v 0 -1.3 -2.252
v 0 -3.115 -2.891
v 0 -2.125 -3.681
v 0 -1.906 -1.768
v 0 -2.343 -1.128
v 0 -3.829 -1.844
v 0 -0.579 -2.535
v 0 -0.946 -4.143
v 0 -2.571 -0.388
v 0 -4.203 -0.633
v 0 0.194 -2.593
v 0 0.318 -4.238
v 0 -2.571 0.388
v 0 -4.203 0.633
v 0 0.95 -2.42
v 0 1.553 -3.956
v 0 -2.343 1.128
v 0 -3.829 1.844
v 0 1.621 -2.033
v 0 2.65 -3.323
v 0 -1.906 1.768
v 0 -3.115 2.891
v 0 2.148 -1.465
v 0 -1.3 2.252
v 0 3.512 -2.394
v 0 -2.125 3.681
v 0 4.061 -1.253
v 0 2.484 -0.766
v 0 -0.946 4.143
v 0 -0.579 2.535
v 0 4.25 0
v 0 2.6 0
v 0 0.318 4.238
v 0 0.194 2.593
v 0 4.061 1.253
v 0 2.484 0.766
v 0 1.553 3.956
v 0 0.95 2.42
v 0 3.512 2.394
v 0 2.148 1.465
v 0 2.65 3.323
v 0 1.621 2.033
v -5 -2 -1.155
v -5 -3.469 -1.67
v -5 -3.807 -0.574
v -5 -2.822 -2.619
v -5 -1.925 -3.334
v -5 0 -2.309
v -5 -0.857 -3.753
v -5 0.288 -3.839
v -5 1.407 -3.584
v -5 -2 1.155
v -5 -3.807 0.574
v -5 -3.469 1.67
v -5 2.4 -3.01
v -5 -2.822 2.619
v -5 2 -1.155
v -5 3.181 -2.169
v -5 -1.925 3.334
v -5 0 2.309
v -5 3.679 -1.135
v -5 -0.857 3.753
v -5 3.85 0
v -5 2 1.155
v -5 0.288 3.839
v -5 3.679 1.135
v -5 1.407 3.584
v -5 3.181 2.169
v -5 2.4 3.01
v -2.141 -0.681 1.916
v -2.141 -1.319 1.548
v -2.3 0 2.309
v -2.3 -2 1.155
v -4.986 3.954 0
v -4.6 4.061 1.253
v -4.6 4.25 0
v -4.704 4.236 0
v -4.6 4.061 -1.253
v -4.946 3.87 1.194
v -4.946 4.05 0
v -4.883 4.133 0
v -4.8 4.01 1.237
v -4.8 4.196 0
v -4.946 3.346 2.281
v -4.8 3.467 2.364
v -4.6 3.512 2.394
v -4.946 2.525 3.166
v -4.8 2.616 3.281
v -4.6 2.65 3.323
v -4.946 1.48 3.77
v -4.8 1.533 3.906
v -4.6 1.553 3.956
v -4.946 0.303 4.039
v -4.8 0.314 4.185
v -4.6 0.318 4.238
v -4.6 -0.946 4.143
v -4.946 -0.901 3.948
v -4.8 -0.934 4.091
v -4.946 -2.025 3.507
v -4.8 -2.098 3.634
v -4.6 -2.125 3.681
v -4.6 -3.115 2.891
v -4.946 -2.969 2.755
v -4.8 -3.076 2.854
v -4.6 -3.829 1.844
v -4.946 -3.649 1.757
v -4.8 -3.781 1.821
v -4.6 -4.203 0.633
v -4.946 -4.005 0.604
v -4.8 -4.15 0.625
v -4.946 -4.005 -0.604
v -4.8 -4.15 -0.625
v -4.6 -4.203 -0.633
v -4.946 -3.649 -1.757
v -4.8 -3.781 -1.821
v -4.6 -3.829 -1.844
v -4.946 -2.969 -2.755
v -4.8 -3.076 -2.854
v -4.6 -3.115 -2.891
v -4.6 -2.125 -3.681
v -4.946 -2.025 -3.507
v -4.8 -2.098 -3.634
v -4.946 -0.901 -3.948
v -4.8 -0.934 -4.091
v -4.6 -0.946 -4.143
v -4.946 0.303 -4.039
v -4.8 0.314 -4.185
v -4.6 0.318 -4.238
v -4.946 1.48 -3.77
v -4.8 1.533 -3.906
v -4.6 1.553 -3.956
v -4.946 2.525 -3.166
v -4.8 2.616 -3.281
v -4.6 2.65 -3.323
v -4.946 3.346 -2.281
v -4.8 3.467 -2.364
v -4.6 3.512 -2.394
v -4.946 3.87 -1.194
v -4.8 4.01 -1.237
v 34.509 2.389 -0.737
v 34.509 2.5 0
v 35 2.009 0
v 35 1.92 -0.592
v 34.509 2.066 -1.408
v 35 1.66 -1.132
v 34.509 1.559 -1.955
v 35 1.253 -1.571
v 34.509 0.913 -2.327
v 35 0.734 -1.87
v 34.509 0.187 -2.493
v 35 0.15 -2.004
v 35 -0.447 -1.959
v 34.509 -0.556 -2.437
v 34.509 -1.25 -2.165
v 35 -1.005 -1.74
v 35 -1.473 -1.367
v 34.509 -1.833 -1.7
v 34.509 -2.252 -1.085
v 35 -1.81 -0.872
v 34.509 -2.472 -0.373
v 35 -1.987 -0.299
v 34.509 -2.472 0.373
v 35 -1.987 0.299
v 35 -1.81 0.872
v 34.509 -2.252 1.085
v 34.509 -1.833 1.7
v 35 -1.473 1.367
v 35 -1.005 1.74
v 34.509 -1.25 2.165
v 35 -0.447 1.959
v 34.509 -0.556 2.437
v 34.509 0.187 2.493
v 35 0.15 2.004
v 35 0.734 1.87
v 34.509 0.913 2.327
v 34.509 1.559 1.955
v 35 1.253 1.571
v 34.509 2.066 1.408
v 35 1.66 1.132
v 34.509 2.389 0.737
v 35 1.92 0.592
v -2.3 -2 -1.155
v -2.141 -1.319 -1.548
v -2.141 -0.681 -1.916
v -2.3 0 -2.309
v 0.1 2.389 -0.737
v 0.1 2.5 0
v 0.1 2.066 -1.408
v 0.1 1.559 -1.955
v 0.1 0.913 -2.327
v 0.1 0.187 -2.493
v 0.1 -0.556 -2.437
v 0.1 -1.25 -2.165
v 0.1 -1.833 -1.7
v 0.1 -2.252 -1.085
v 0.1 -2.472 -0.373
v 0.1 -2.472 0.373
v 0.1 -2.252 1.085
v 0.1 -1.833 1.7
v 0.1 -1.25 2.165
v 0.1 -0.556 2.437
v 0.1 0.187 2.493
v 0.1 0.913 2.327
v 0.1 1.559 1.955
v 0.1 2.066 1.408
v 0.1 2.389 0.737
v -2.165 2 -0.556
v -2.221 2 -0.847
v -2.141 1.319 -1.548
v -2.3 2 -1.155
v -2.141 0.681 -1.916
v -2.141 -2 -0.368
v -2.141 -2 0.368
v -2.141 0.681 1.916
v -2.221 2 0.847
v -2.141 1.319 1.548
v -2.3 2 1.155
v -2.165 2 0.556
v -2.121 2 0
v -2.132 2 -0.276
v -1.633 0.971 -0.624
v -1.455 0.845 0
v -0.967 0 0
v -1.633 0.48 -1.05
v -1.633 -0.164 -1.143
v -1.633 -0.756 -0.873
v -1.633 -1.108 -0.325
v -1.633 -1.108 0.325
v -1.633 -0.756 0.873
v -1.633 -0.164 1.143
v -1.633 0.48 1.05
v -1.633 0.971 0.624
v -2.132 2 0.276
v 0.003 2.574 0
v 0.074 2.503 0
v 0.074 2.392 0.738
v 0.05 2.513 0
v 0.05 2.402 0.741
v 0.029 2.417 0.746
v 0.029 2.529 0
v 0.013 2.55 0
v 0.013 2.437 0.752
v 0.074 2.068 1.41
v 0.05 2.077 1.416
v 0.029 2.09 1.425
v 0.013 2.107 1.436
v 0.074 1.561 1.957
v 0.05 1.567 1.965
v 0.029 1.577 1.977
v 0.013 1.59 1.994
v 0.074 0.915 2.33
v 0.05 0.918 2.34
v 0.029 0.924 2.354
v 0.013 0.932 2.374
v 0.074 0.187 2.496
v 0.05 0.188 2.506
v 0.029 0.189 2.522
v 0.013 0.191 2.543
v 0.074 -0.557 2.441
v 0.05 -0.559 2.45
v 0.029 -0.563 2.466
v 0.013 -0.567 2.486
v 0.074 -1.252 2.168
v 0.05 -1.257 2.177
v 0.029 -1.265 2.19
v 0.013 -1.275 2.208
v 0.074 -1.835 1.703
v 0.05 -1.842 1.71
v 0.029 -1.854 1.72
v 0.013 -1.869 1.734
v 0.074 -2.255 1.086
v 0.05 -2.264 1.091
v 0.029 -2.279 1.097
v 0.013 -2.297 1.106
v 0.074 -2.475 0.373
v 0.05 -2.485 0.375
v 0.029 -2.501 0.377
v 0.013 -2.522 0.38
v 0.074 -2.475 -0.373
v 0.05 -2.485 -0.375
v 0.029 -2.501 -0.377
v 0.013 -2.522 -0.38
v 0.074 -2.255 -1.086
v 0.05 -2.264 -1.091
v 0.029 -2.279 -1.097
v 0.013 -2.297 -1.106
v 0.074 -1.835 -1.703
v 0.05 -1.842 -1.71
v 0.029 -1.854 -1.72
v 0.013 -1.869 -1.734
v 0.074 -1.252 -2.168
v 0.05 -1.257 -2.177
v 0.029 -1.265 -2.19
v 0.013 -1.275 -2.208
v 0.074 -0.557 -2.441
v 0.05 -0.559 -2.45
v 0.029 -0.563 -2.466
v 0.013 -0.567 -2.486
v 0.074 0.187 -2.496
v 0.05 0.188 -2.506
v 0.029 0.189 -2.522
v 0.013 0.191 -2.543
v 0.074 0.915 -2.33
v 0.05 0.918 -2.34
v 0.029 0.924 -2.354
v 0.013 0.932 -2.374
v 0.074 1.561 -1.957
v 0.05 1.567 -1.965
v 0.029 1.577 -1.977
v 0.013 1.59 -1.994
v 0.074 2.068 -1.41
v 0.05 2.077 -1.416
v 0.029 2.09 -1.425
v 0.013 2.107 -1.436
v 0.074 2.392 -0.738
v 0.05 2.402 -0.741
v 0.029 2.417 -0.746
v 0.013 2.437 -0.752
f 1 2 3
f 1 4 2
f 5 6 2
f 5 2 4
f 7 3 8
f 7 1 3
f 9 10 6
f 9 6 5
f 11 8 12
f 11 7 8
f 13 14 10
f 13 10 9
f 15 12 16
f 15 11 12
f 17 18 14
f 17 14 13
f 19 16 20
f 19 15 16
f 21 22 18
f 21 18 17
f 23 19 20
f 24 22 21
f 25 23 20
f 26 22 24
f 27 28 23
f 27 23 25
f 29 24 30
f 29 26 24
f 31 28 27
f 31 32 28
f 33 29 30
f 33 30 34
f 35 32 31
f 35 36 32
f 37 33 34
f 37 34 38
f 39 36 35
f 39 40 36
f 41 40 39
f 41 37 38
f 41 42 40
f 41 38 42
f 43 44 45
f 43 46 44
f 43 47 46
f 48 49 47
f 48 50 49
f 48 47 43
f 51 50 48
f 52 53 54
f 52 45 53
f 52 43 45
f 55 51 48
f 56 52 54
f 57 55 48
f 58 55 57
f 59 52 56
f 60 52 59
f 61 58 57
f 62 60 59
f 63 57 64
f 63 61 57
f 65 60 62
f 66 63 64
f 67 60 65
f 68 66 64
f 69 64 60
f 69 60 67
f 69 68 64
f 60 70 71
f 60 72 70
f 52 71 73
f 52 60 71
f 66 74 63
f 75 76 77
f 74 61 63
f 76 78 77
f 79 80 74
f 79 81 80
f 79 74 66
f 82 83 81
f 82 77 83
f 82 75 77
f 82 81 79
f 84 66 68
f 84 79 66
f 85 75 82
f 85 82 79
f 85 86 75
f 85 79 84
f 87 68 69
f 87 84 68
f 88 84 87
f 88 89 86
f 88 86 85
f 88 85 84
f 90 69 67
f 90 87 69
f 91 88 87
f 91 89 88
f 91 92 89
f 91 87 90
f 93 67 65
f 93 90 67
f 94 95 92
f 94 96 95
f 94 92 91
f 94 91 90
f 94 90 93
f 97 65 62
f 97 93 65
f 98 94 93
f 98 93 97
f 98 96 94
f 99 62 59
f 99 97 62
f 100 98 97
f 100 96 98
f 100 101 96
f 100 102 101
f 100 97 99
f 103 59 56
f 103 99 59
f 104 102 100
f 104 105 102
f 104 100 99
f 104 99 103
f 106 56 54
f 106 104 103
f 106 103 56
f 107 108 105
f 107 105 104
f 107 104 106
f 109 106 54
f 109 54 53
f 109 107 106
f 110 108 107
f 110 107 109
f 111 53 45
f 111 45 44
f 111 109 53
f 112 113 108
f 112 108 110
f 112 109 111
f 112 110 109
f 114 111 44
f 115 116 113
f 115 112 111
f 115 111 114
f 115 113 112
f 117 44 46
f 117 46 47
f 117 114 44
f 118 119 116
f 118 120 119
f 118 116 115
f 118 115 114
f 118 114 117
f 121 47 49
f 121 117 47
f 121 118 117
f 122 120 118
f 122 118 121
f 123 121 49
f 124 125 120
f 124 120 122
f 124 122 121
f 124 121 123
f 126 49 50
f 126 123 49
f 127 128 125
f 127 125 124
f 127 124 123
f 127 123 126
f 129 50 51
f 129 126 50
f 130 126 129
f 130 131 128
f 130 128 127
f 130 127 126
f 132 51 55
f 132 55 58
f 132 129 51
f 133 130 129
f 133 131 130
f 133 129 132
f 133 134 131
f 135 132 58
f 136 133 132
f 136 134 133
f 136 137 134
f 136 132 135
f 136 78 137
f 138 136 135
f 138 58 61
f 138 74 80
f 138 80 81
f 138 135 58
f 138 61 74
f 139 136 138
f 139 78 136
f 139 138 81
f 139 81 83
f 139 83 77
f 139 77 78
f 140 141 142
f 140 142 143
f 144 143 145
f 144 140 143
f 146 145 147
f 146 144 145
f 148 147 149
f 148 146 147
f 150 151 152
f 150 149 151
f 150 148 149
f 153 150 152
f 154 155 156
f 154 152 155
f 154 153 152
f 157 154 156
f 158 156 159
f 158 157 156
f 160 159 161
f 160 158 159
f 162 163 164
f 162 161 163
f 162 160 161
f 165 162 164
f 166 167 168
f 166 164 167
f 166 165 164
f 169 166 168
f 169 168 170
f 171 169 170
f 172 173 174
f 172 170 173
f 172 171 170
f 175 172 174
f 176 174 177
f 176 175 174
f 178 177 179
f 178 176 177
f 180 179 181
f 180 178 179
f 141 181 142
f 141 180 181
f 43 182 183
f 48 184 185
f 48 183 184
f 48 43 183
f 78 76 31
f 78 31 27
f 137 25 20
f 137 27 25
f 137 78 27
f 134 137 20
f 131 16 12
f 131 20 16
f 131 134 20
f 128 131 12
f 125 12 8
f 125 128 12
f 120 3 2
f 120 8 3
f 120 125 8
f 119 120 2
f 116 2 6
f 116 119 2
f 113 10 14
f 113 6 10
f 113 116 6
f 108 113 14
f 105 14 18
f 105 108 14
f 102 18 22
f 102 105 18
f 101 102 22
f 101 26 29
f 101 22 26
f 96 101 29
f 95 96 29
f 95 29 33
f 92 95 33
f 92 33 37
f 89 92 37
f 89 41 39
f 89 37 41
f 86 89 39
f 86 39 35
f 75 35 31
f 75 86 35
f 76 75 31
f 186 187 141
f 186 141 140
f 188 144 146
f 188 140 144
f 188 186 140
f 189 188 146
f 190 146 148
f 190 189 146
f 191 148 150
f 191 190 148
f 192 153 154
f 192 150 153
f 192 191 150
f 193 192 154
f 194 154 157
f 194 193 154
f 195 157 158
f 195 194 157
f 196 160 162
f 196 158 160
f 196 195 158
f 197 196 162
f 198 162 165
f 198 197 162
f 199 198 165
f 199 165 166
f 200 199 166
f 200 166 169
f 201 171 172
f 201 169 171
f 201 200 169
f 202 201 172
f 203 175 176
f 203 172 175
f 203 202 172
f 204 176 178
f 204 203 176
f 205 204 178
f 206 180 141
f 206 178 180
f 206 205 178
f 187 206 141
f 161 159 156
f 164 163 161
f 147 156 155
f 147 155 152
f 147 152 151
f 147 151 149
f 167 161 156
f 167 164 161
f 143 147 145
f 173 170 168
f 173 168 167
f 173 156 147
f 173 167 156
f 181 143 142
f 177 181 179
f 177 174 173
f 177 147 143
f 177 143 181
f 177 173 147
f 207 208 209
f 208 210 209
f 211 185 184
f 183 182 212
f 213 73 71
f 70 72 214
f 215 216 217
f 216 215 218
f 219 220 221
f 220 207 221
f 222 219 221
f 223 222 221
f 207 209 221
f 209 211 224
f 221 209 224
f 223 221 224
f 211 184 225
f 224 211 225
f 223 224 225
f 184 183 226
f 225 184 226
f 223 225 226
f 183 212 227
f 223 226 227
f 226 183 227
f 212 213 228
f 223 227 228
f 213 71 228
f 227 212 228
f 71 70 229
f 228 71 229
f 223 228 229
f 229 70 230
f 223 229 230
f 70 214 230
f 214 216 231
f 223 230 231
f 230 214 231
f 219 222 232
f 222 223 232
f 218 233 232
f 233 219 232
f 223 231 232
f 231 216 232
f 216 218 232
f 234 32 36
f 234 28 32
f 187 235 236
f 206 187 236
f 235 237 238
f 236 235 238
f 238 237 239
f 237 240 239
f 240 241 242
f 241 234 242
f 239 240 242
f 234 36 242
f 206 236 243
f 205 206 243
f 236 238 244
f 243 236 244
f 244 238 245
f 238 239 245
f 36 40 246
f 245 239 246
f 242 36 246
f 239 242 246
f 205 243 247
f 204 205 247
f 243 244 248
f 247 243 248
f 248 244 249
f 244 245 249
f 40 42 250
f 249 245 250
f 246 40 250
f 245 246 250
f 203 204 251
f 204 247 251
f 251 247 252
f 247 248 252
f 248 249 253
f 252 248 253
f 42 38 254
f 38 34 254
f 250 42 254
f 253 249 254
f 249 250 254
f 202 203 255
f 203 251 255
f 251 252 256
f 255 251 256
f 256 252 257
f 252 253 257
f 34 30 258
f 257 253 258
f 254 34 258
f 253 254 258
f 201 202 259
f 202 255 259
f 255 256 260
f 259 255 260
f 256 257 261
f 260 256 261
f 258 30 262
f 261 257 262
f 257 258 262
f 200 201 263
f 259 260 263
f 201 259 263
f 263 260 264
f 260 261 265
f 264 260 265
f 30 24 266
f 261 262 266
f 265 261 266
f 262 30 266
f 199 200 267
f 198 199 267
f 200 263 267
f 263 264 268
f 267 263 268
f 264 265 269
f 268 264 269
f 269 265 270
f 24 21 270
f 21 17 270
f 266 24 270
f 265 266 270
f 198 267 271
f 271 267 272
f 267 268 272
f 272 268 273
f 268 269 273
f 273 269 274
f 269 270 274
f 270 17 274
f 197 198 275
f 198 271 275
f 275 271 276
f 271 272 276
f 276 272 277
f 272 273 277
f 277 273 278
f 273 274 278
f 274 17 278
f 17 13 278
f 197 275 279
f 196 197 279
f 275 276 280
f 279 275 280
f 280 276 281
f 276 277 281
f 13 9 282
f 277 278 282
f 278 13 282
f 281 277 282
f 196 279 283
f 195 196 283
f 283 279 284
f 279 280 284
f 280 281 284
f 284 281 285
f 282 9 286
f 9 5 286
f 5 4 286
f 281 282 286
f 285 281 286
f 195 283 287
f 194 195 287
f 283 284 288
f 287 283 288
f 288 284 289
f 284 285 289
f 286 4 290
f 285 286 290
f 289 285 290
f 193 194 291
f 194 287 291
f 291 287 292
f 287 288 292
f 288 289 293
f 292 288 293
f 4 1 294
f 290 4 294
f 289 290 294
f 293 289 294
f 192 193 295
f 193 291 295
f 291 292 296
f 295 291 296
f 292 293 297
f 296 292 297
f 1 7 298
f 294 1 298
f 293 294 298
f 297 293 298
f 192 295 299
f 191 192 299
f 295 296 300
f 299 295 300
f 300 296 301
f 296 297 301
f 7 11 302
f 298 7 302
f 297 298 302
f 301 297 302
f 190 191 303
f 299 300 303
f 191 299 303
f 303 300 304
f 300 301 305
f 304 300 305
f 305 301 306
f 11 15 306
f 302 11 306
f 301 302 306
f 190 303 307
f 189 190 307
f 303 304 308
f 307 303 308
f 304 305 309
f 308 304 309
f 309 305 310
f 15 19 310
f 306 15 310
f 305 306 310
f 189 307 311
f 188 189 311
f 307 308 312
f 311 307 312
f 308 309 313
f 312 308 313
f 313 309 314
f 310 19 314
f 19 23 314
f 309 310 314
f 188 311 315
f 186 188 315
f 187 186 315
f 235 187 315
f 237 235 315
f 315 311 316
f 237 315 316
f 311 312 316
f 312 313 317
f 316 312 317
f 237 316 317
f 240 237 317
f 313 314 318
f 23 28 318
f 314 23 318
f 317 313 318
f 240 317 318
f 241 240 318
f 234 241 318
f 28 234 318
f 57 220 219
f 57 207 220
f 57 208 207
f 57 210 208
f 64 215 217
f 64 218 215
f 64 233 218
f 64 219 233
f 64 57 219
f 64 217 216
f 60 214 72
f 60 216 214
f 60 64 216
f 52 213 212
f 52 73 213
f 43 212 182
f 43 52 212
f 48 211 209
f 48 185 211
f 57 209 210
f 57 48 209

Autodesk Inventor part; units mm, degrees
ref_plane "YZ Plane" through (0, 0, 0) normal (1, 0, 0) x (0, 1, 0)
ref_plane "XZ Plane" through (0, 0, 0) normal (0, 1, 0) x (-1, 0, 0)
sketch "Sketch1" plane through (0, 0, 0) normal (0, 0, 1) x (1, 0, 0)
  line L0 (-0.9667, 0) -> (35, 0)
  line L1 (35, 0) -> (35, 2.5)
  line L2 (35, 2.5) -> (19, 2.5)
  line L3 (19, 2.5) -> (18.5091, 2.5)
  line L4 (18.5091, 2.5) -> (0, 2.5)
  line L5 (0, 2.5) -> (0, 4.25)
  line L6 (0, 4.25) -> (-5, 4.25)
  line L7 (-5, 4.25) -> (-5, 2.3094)
  line L8 (-5, 2.3094) -> (-2.3, 2.3094)
  line L9 (-2.3, 2.3094) -> (-0.9667, 0)
  line L10 (-13, 0) -> (43, 0) projected
  line L11 (0, -0.85) -> (0, 5.1) projected
  line L12 (19, 2.5) -> (0, 2.5) construction
  dimension "d1" = 16
  dimension "d2" = 0.4909
  dimension "d3" = 5
  dimension "d4" = 2.7
  dimension "d5" = 60
  dimension "d6" = 5
  dimension "d7" = 5
  dimension "d8" = 4.6188
  dimension "d9" = 8.5
  dimension "d26" = 35
revolve "Body" add sketch "Sketch1" angle 360 about axis through (-0.9667, 0, 0) along (1, 0, 0)
sketch "Sketch2" plane through (-5, 0, 0) normal (-1, 0, 0) x (0, 0, 1)
  circle A0 centre (0, 0) radius 2.3094 projected
  line L0 (0, -5.95) -> (0, 5.95) projected
  line L1 (-5.95, 0) -> (5.95, 0) projected
  line L2 (2.3094, 0) -> (1.1547, -2)
  line L3 (1.1547, -2) -> (-1.1547, -2)
  line L4 (-1.1547, -2) -> (-2.3094, 0)
  line L5 (-2.3094, 0) -> (-1.1547, 2)
  line L6 (-1.1547, 2) -> (1.1547, 2)
  line L7 (1.1547, 2) -> (2.3094, 0)
extrude "Slot" add sketch "Sketch2" against normal up to next contours L7 A0 | A0 L2 | L6 L0 A0 | A0 L0 L3 | L0 L6 A0 | A0 L3 L0 | L4 A0 | A0 L5
fillet "Fillet1" radius 0.4 1 edges at (-5, -4.25, 0)
thread "Thread" size "M5x0.8" class "6g" standard "ISO Metric profile" length 16
chamfer "Chamfer1" distance 0.4908 distance2 0.4908 1 edges at (35, -2.5, 0) measured on face at (35, -0.7192, 0.1653)
ref_plane "Work Plane1" through (29, 0, 0) normal (0, -1, 0) x (1, 0, 0)
fillet "Fillet2" radius 0.1 1 edges at (0, -2.5, 0)
equation "\"d30\" = R"
equation "\"d17\" = RR"
equation "\"d13\" = GEL"
equation "\"d15\" = -0.5 * SPD + 0.5 * GD"
equation "\"d16\" = GUL"
equation "\"d1\" = GEL"
equation "\"d3\" = KOH"
equation "\"d4\" = INTI"
equation "\"d6\" = GD"
equation "\"d7\" = BDM"
equation "\"d8\" = 1.1547 * SW"
equation "\"d9\" = KOD"
equation "\"d26\" = NLG"
equation "\"GD\" = NND"
equation "\"NLG\" = 35"
equation "\"GEL\" = 16"
equation "\"KOD\" = 8.5"
equation "\"KOH\" = NND"
equation "\"INTI\" = 2.7"
equation "\"GAL\" = 0.61345 * PTC"
equation "\"GUL\" = 0.61345 * PTC"
equation "\"BDM\" = NND"
equation "\"SW\" = 4"
equation "\"RR\" = 0.4"
equation "\"SPD\" = NND - 1.2269 * PTC"
equation "\"R\" = 0.1"
equation "\"TOA\" = 30deg"
equation "\"GD1\" = THREADDIA - 1.2269 * PTC"
equation "\"THREADDIA\" = 5"
equation "\"FAWI\" = 45deg"
equation "\"PTC\" = 0.8"
equation "\"NND\" = 5"
equation "\"E0\" = 1.155 * SW"
equation "\"PHH\" = 0"
properties part number "CSN 02 1143 - M5 x 35" material "Steel, Mild"
